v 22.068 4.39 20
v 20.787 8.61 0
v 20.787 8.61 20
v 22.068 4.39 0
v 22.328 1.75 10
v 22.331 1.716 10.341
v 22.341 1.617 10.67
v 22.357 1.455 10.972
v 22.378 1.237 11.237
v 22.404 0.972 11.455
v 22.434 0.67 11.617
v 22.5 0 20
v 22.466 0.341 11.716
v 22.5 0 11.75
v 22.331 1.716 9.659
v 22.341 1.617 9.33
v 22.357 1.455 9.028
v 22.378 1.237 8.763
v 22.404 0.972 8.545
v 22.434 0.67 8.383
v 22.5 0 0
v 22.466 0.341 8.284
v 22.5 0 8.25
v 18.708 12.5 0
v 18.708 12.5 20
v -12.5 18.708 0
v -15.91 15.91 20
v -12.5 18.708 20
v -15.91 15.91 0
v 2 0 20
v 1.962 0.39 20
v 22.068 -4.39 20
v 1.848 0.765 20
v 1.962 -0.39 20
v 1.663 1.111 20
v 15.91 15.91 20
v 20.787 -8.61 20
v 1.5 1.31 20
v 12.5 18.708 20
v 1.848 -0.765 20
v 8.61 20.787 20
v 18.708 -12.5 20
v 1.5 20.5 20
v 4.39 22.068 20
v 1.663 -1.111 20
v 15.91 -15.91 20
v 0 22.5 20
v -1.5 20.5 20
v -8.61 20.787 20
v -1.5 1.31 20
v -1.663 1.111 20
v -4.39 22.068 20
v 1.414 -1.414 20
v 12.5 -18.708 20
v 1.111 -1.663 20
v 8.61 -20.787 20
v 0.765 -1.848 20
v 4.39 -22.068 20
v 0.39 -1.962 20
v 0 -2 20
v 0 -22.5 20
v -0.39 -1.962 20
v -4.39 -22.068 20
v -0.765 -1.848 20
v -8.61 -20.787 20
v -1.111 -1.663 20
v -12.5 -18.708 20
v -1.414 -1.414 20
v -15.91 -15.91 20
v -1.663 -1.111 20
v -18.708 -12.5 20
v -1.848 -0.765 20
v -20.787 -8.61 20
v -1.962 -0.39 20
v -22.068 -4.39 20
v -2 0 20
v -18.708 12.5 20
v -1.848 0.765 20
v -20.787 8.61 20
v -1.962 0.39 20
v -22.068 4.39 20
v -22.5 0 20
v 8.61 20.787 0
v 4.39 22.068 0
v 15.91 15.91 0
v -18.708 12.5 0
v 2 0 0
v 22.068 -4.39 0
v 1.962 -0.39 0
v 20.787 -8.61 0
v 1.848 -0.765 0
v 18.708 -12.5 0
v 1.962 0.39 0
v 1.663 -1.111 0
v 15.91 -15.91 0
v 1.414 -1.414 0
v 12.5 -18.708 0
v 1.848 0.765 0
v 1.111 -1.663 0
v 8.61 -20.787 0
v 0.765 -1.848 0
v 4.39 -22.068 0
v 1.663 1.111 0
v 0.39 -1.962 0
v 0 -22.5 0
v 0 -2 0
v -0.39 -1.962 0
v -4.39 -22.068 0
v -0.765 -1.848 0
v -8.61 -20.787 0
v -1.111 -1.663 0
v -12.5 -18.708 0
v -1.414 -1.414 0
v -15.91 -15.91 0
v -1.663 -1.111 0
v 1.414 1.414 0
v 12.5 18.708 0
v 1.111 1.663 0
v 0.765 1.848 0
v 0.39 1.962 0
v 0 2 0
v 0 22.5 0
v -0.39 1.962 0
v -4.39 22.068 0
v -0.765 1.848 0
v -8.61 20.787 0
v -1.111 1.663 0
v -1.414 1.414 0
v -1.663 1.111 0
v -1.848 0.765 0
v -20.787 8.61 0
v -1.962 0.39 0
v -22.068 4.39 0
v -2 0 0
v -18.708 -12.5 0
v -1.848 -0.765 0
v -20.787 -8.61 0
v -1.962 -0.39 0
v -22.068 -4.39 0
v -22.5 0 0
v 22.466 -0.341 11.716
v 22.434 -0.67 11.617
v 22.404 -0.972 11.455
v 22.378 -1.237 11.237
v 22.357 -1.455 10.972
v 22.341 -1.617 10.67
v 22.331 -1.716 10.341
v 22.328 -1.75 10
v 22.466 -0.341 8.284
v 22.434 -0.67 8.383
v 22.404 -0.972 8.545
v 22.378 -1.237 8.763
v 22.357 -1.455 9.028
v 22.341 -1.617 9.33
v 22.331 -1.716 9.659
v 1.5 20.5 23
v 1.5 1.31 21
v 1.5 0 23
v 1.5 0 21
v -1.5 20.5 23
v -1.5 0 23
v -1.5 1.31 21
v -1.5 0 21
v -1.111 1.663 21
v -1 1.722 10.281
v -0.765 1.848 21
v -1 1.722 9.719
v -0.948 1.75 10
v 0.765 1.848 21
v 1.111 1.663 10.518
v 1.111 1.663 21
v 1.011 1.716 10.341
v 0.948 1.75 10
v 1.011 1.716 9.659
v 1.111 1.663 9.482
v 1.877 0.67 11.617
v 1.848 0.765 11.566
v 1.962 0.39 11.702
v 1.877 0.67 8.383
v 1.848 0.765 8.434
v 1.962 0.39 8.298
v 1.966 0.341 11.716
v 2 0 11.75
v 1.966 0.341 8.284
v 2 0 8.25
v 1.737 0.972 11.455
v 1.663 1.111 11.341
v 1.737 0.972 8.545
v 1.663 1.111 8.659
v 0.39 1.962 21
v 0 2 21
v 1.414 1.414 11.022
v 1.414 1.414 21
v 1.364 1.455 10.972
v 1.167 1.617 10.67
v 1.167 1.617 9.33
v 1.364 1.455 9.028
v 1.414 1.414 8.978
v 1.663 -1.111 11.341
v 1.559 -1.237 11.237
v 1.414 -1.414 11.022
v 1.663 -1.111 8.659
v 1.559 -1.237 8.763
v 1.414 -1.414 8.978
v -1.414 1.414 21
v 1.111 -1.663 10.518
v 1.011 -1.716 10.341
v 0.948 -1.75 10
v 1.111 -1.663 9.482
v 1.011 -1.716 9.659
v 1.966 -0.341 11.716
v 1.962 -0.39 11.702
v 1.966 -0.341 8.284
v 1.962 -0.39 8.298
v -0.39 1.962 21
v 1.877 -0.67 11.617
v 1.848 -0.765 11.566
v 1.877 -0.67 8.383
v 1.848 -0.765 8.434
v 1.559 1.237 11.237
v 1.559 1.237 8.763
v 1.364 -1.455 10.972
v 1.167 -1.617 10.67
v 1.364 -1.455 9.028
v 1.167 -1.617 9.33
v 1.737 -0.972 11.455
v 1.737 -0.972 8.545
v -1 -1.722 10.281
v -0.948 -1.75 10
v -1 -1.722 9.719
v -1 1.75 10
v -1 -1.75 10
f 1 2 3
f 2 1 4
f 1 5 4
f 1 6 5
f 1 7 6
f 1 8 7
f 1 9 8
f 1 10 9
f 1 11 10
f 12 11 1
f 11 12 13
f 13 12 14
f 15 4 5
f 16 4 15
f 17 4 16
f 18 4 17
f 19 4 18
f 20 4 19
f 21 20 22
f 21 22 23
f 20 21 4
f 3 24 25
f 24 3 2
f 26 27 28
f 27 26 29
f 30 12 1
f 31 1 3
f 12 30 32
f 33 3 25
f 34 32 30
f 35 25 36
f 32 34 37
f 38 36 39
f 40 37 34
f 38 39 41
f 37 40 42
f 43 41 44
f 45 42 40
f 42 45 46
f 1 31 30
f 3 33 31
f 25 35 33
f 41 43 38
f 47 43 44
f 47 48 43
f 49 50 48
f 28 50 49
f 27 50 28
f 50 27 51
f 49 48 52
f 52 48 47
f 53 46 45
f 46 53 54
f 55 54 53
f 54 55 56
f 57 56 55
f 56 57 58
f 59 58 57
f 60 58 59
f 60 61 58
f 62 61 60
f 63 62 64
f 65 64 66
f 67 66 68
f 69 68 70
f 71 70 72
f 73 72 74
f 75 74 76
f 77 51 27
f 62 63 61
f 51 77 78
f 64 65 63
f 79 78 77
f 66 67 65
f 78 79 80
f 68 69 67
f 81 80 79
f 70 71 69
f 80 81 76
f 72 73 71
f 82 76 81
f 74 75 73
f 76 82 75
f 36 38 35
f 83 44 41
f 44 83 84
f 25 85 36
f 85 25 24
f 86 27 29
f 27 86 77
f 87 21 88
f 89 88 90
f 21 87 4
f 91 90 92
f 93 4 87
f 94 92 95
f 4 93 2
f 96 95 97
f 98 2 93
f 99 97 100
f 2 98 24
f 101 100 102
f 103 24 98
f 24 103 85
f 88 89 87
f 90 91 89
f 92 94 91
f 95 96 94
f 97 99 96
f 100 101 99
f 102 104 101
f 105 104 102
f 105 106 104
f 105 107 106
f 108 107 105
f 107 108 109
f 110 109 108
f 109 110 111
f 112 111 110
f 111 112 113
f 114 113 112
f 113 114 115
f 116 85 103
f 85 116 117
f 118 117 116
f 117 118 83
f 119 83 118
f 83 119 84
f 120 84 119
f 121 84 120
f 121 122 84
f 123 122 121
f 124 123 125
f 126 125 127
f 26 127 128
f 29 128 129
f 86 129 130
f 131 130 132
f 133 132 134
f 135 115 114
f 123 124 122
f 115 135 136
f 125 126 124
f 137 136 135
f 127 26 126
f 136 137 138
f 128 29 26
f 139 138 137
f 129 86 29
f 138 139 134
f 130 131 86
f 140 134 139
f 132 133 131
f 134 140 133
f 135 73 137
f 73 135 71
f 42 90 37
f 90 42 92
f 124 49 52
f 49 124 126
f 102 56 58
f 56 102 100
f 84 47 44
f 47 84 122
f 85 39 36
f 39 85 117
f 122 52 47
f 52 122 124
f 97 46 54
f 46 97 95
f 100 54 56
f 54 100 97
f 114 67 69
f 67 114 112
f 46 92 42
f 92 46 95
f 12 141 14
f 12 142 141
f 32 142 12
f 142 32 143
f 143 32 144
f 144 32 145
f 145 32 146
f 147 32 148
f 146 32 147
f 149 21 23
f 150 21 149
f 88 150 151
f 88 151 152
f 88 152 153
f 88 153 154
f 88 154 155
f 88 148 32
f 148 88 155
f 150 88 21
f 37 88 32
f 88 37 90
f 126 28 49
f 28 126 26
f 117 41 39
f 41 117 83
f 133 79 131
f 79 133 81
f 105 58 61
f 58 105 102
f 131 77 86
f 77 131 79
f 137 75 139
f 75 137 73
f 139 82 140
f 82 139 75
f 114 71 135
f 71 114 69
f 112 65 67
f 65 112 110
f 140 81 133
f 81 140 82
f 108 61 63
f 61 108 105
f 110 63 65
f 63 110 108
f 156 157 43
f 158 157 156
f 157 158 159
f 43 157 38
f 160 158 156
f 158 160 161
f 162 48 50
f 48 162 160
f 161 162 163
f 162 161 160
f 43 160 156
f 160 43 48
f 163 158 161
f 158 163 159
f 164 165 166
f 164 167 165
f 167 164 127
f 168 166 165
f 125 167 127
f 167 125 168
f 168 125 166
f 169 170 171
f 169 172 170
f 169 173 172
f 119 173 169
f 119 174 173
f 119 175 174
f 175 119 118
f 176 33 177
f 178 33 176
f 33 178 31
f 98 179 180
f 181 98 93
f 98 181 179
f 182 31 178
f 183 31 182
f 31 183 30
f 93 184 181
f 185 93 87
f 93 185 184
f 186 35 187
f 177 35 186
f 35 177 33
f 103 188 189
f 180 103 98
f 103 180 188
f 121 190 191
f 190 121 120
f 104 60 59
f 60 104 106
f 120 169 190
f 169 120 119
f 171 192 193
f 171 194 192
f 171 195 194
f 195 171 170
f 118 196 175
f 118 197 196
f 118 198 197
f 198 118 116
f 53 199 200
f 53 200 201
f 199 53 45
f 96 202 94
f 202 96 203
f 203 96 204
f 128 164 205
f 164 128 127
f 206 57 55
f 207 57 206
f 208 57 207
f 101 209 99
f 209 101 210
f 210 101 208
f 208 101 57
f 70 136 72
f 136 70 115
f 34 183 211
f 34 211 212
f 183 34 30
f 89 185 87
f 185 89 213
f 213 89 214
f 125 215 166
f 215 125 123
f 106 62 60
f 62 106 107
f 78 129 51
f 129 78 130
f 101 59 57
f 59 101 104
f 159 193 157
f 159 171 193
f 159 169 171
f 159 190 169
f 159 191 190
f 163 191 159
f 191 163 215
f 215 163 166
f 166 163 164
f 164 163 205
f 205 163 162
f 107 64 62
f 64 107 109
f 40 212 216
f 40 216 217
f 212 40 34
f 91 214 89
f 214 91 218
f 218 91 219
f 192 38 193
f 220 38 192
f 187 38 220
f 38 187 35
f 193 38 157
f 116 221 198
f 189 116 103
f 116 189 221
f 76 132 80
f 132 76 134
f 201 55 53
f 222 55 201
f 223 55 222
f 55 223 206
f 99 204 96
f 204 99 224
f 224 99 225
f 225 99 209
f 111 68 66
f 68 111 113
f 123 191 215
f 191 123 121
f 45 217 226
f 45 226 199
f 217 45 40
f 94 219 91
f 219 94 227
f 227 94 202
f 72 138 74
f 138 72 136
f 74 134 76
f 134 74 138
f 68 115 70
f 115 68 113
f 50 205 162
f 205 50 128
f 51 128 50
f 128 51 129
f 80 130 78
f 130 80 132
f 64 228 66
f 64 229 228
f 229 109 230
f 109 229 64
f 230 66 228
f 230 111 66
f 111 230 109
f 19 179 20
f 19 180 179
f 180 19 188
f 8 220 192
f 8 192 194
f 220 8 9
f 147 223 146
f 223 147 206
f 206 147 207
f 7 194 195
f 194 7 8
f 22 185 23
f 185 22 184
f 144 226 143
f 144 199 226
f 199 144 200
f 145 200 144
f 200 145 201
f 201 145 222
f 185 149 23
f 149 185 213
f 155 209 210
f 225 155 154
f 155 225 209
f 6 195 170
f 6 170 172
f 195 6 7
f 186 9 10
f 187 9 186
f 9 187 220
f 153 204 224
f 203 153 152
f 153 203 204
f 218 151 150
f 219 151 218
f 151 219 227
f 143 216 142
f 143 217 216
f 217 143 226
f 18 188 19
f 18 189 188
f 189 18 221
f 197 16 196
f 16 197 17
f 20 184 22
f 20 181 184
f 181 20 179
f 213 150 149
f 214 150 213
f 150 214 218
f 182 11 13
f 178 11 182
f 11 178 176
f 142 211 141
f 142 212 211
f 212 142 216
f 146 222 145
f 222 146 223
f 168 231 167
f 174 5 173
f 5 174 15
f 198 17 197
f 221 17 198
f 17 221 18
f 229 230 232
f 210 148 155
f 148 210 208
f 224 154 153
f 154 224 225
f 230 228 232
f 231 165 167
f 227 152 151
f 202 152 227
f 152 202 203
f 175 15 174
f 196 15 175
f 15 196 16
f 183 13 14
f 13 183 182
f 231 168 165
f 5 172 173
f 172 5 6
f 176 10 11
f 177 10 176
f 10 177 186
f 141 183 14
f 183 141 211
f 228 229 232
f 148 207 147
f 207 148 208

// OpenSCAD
$fn = 32;

// ----------------------------------------------------------------------
// Control knob: pointer knob
// ----------------------------------------------------------------------

// --- parameters (mm) ---
rib_w = 3;                // pointer rib width
rib_h = 4;                // pointer rib height
knob_d = 45;              // knob body diameter
knob_h = 20;              // knob body height
bore_d = 4;               // shaft bore diameter
set_d = 3.5;              // set screw bore diameter

rib_poke = rib_h - 1;  // rib height above the top
total_h = knob_h + rib_h - 1;  // overall height

difference() {
  union() {
    cylinder(h = knob_h, d = knob_d);
    translate([-rib_w / 2, 0, knob_h - 1])
      cube([rib_w, knob_d / 2 - 2, rib_h]);
  }
  translate([0, 0, -1]) cylinder(h = knob_h + 2, d = bore_d);
  translate([-1, 0, knob_h / 2]) rotate([0, 90, 0])
    cylinder(h = knob_d / 2 + bore_d / 2 + 2, d = set_d);}
